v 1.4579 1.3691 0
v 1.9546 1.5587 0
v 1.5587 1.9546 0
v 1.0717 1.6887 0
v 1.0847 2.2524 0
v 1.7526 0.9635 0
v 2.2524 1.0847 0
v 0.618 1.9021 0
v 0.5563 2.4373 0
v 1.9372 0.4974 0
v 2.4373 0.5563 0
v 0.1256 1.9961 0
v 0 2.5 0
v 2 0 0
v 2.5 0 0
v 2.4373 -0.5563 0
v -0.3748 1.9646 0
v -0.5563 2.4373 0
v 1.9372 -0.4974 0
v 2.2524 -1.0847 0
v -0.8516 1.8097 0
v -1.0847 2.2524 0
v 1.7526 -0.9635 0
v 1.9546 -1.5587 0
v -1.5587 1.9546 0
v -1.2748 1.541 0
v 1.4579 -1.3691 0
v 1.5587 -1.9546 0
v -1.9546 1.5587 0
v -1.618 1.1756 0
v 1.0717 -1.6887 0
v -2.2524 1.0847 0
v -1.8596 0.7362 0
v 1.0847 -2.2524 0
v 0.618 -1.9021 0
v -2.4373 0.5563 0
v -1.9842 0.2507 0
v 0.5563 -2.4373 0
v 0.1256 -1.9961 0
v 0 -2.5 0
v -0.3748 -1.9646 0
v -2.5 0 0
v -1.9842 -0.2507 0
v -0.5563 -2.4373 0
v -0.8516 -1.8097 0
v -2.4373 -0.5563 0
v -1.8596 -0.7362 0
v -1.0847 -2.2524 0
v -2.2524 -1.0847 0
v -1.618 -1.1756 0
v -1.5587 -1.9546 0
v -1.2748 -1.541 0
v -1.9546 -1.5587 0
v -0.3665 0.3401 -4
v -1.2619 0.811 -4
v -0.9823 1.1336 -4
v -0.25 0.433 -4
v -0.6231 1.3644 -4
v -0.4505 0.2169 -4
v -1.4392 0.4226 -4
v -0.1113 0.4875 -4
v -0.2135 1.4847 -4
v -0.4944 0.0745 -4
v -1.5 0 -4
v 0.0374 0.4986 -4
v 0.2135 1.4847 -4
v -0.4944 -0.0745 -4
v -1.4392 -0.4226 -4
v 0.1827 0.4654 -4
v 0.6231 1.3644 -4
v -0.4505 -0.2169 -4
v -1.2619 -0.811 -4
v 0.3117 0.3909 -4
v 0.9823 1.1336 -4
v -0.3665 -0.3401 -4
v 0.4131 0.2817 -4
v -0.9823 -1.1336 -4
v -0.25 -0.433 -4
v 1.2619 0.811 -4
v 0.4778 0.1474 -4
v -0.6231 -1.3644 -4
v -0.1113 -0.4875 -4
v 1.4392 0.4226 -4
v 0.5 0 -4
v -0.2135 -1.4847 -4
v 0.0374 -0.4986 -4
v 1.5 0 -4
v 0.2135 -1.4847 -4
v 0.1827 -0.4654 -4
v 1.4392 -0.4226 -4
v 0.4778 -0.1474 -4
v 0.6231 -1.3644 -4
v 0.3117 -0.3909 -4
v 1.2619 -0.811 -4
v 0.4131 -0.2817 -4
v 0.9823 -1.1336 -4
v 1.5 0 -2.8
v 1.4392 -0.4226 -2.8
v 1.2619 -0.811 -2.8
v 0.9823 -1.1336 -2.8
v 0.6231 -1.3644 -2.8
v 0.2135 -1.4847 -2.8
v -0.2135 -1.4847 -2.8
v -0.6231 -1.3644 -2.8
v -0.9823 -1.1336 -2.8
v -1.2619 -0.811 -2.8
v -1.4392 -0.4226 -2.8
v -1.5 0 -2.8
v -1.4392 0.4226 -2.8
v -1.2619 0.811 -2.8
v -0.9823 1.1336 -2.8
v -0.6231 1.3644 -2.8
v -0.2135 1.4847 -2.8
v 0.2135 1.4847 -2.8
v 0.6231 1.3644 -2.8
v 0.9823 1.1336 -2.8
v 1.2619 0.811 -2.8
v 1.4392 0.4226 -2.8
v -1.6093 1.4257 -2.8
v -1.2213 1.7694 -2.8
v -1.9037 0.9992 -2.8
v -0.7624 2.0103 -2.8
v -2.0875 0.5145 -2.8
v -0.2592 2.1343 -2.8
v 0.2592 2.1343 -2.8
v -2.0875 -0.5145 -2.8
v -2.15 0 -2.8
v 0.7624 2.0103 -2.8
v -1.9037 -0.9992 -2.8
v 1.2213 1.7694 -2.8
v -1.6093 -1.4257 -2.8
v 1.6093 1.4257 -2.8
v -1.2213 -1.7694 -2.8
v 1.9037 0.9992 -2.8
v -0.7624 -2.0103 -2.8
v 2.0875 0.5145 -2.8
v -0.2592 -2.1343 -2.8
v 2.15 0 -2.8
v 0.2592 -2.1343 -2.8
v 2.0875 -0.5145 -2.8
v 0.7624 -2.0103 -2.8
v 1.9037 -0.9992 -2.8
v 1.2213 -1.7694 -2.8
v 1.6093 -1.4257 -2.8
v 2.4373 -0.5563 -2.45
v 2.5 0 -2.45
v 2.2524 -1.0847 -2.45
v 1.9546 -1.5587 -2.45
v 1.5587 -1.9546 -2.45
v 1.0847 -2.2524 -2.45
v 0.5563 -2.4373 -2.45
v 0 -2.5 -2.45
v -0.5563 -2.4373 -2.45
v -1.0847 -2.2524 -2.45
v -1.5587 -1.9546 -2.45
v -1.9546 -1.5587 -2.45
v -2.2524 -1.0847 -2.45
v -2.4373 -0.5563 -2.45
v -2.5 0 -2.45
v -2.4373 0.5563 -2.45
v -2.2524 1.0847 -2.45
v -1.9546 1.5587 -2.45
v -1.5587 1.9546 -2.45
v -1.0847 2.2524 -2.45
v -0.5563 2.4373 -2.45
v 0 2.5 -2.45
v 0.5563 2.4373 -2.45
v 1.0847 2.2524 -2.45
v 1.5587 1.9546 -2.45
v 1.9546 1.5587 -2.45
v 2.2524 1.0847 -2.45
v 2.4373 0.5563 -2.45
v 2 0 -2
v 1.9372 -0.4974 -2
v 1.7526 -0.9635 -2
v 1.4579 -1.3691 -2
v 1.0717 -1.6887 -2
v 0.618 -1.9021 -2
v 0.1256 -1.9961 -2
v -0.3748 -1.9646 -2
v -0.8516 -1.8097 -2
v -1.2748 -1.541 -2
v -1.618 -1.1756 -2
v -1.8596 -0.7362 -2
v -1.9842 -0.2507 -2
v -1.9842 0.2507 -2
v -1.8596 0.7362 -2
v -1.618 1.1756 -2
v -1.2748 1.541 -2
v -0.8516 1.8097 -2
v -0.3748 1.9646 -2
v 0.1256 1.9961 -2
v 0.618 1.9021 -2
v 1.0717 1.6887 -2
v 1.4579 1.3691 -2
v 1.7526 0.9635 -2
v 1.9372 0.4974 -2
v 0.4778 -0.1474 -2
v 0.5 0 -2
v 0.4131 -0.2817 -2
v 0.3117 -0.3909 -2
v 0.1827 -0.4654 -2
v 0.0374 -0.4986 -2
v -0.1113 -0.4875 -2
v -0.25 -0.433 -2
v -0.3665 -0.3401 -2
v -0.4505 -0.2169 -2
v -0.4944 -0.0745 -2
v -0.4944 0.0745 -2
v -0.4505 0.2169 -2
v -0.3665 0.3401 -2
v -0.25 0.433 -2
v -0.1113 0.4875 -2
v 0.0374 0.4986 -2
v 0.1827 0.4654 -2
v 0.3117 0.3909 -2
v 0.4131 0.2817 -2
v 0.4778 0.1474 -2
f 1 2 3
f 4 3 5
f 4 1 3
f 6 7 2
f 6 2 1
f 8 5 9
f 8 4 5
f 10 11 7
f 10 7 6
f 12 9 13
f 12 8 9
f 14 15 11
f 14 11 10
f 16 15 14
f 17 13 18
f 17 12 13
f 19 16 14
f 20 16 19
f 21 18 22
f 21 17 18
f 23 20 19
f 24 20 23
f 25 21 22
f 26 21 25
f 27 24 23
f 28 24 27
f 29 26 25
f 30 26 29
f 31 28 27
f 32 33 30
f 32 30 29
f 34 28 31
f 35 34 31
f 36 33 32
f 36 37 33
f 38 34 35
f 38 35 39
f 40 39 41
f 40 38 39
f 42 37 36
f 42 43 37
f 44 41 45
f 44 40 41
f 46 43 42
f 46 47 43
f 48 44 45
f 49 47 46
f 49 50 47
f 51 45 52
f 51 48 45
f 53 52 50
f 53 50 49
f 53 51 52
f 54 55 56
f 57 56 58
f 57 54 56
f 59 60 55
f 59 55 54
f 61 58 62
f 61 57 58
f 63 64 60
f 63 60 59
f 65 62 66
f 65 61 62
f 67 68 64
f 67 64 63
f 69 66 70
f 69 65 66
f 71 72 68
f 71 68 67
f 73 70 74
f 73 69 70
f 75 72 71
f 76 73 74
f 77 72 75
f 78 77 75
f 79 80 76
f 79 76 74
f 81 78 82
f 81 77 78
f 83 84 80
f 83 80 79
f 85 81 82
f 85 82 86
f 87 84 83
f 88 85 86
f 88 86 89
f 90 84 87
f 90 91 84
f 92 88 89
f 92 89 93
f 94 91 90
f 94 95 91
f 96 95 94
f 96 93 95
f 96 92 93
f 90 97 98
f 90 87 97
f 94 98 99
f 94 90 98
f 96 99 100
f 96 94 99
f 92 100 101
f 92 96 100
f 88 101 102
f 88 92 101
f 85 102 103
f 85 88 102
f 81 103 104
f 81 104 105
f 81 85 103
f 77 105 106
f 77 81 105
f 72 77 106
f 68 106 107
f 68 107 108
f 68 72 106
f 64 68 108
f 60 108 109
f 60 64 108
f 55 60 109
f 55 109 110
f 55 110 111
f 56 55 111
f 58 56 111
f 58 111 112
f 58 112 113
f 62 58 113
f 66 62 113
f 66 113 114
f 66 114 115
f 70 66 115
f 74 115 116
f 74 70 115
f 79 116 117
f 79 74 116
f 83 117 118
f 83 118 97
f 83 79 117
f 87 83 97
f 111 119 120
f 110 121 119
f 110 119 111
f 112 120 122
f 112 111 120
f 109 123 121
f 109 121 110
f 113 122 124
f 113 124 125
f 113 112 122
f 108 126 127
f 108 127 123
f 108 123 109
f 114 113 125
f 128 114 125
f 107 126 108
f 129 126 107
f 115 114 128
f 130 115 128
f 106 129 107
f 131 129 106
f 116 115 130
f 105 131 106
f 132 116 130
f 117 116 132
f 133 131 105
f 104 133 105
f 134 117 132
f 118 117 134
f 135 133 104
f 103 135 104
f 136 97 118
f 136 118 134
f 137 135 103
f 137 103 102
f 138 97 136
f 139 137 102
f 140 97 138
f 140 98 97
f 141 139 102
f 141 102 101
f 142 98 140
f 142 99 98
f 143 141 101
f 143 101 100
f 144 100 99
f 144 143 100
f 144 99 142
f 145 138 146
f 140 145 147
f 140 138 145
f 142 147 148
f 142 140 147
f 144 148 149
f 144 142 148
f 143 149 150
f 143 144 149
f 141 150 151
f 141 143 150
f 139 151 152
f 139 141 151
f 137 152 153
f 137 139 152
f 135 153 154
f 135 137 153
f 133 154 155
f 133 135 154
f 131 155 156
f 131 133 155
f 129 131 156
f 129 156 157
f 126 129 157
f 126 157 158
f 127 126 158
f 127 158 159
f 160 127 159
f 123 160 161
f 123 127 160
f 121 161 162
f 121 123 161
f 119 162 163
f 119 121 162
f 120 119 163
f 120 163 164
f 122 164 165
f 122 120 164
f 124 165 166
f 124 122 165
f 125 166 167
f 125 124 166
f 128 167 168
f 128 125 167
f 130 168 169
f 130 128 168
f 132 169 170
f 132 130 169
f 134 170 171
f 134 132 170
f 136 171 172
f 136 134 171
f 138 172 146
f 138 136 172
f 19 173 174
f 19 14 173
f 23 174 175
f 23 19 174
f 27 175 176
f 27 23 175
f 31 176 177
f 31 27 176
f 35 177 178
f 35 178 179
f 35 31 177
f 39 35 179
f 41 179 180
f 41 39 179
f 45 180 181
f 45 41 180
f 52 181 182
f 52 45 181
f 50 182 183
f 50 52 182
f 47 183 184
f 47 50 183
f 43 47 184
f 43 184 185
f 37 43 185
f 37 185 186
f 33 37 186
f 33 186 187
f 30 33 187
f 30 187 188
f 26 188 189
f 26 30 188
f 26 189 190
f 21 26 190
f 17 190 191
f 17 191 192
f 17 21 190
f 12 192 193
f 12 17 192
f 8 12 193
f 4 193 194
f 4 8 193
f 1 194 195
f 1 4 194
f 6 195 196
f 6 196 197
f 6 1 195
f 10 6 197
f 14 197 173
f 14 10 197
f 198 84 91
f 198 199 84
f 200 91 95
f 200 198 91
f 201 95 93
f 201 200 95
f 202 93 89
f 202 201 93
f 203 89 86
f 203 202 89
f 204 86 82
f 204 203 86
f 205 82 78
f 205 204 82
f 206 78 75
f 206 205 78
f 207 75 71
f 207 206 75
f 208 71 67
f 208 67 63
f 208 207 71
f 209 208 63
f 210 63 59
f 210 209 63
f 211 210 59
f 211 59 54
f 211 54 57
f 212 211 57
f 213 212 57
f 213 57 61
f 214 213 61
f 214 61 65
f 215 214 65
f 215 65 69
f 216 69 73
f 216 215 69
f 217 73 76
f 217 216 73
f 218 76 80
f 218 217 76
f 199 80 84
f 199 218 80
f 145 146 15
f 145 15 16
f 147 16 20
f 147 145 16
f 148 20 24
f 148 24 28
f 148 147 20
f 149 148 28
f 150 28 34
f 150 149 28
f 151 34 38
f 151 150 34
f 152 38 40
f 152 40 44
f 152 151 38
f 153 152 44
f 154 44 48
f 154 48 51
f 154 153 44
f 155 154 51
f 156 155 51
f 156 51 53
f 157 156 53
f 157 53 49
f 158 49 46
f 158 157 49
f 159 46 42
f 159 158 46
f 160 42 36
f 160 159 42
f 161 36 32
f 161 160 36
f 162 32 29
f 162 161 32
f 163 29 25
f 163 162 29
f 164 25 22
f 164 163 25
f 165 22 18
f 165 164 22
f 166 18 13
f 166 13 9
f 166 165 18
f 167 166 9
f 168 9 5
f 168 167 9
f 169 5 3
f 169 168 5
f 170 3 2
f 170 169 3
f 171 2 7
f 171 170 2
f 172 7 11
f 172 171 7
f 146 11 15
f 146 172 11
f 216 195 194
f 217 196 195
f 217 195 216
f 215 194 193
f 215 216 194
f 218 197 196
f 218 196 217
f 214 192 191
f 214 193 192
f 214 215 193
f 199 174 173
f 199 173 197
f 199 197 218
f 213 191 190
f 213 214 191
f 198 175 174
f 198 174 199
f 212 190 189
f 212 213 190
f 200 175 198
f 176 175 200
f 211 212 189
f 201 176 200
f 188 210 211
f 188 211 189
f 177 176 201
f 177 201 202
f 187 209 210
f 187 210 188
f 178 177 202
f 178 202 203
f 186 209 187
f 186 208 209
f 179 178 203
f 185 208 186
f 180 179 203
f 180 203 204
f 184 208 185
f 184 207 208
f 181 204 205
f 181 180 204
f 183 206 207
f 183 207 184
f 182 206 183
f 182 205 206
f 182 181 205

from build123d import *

# Parameters (mm, degrees)
FASE1_SIZE = 0.35


with BuildPart() as part:
    # Sketch1 → Revolve1 (revolve)
    with BuildSketch(Plane(origin=(0, 0, 0), x_dir=(0, 0, -1), z_dir=(1, 0, 0)), mode=Mode.PRIVATE) as revolve1_sk:
        Polygon((0, 2.5), (2.8, 2.5), (2.8, 1.5), (4, 1.5), (4, 0.5), (2, 0.5), (2, 2), (0, 2), align=None)
    revolve(revolve1_sk.sketch.rotate(Axis((0, 0, 20.700415561), (0, 0, -1)), 90), axis=Axis((0, 0, 20.700415561), (0, 0, -1)))

    # Fase1
    fase1_edges = [part.edges().sort_by_distance(p)[0] for p in [
        (-2.5, 0, -2.8),
    ]]
    chamfer(fase1_edges, length=FASE1_SIZE)


solid = part.part
